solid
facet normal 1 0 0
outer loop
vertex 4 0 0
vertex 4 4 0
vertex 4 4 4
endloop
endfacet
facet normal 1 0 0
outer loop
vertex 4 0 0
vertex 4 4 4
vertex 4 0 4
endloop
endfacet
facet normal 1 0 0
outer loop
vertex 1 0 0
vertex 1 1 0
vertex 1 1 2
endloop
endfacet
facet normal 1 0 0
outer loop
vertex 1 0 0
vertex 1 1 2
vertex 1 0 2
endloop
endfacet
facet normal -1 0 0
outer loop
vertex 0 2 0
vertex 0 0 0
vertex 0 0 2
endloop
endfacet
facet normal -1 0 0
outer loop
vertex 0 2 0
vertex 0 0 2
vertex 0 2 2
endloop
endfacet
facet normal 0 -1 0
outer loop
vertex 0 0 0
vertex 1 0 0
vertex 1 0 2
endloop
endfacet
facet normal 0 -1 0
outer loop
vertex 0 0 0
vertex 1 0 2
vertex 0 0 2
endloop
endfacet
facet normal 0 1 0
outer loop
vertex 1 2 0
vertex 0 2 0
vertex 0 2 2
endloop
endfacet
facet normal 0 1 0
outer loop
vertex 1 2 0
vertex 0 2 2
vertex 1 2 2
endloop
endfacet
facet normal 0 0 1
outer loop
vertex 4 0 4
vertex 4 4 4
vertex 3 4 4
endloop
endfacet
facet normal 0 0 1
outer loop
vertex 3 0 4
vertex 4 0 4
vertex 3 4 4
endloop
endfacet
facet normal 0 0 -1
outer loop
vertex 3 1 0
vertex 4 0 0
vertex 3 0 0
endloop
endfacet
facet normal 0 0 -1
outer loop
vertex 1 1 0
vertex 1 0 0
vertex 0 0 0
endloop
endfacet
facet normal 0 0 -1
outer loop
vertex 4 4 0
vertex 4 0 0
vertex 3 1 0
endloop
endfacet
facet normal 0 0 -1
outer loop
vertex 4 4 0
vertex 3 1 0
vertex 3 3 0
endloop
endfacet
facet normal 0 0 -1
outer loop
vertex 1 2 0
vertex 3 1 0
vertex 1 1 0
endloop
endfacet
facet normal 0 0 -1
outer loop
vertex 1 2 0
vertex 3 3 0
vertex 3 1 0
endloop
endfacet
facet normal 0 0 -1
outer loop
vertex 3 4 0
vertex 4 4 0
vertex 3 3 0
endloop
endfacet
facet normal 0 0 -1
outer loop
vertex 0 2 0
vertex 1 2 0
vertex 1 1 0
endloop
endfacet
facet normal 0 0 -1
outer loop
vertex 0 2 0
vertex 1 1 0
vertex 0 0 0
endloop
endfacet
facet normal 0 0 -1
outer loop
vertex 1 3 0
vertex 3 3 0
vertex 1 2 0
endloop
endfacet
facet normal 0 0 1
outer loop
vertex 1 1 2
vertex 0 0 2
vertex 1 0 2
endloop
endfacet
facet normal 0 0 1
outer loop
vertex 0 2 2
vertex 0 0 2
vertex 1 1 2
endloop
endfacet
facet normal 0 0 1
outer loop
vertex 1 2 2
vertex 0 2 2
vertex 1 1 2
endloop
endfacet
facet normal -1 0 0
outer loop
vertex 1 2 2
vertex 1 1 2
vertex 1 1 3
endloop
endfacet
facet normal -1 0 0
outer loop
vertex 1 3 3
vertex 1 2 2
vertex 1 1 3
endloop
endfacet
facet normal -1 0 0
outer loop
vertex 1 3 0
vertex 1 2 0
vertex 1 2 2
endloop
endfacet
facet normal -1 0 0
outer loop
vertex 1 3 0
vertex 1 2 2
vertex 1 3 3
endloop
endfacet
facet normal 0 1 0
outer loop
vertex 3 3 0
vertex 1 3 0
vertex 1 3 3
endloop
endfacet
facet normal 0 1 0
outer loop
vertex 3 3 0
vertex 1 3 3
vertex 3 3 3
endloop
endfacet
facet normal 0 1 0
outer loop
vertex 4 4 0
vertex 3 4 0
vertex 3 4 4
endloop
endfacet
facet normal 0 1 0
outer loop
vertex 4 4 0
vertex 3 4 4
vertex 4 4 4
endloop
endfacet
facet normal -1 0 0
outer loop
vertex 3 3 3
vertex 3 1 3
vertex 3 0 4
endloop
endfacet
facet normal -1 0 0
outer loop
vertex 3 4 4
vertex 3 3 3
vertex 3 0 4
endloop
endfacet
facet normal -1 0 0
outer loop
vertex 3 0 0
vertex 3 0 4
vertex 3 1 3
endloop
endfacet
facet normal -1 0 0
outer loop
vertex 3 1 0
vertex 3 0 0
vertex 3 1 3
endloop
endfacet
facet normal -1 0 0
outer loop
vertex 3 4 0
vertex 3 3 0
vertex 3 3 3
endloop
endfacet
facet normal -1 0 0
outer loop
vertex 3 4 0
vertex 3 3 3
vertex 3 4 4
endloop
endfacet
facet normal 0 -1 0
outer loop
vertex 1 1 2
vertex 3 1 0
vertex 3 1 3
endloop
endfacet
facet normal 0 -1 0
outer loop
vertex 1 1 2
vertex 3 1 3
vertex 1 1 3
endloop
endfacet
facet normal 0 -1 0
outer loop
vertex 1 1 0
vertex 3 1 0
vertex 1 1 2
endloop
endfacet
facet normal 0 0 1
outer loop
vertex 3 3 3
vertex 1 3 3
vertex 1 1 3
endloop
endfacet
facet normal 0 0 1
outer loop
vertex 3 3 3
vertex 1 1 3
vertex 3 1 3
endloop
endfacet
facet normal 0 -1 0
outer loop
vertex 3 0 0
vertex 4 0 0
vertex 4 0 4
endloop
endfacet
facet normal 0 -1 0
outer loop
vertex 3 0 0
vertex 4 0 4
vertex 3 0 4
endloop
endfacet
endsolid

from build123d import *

# Parameters (mm, degrees)
BOSS_EXTRUDE1_DEPTH = 4
SKETCH2_W           = 1
SKETCH2_H           = 3
CUT_EXTRUDE1_DEPTH  = 2
SKETCH3_W           = 2
SKETCH3_H           = 3
CUT_EXTRUDE2_DEPTH  = 1


with BuildPart() as part:
    # Sketch1 → Boss-Extrude1 (new body)
    with BuildSketch(Plane.XY):
        Polygon((0, 0), (0, 2), (1, 2), (1, 3), (3, 3), (3, 4), (4, 4), (4, 0), (3, 0), (3, 1), (1, 1), (1, 0), align=None)
    extrude(amount=BOSS_EXTRUDE1_DEPTH)

    # Sketch2 → Cut-Extrude1 (cut)
    with BuildSketch(Plane.XY.offset(4)):
        with Locations((0.5, 1.5)):
            Rectangle(SKETCH2_W, SKETCH2_H)
    extrude(amount=-CUT_EXTRUDE1_DEPTH, mode=Mode.SUBTRACT)

    # Sketch3 → Cut-Extrude2 (cut)
    with BuildSketch(Plane.XY.offset(4)):
        with Locations((2, 1.5)):
            Rectangle(SKETCH3_W, SKETCH3_H)
    extrude(amount=-CUT_EXTRUDE2_DEPTH, mode=Mode.SUBTRACT)


solid = part.part
